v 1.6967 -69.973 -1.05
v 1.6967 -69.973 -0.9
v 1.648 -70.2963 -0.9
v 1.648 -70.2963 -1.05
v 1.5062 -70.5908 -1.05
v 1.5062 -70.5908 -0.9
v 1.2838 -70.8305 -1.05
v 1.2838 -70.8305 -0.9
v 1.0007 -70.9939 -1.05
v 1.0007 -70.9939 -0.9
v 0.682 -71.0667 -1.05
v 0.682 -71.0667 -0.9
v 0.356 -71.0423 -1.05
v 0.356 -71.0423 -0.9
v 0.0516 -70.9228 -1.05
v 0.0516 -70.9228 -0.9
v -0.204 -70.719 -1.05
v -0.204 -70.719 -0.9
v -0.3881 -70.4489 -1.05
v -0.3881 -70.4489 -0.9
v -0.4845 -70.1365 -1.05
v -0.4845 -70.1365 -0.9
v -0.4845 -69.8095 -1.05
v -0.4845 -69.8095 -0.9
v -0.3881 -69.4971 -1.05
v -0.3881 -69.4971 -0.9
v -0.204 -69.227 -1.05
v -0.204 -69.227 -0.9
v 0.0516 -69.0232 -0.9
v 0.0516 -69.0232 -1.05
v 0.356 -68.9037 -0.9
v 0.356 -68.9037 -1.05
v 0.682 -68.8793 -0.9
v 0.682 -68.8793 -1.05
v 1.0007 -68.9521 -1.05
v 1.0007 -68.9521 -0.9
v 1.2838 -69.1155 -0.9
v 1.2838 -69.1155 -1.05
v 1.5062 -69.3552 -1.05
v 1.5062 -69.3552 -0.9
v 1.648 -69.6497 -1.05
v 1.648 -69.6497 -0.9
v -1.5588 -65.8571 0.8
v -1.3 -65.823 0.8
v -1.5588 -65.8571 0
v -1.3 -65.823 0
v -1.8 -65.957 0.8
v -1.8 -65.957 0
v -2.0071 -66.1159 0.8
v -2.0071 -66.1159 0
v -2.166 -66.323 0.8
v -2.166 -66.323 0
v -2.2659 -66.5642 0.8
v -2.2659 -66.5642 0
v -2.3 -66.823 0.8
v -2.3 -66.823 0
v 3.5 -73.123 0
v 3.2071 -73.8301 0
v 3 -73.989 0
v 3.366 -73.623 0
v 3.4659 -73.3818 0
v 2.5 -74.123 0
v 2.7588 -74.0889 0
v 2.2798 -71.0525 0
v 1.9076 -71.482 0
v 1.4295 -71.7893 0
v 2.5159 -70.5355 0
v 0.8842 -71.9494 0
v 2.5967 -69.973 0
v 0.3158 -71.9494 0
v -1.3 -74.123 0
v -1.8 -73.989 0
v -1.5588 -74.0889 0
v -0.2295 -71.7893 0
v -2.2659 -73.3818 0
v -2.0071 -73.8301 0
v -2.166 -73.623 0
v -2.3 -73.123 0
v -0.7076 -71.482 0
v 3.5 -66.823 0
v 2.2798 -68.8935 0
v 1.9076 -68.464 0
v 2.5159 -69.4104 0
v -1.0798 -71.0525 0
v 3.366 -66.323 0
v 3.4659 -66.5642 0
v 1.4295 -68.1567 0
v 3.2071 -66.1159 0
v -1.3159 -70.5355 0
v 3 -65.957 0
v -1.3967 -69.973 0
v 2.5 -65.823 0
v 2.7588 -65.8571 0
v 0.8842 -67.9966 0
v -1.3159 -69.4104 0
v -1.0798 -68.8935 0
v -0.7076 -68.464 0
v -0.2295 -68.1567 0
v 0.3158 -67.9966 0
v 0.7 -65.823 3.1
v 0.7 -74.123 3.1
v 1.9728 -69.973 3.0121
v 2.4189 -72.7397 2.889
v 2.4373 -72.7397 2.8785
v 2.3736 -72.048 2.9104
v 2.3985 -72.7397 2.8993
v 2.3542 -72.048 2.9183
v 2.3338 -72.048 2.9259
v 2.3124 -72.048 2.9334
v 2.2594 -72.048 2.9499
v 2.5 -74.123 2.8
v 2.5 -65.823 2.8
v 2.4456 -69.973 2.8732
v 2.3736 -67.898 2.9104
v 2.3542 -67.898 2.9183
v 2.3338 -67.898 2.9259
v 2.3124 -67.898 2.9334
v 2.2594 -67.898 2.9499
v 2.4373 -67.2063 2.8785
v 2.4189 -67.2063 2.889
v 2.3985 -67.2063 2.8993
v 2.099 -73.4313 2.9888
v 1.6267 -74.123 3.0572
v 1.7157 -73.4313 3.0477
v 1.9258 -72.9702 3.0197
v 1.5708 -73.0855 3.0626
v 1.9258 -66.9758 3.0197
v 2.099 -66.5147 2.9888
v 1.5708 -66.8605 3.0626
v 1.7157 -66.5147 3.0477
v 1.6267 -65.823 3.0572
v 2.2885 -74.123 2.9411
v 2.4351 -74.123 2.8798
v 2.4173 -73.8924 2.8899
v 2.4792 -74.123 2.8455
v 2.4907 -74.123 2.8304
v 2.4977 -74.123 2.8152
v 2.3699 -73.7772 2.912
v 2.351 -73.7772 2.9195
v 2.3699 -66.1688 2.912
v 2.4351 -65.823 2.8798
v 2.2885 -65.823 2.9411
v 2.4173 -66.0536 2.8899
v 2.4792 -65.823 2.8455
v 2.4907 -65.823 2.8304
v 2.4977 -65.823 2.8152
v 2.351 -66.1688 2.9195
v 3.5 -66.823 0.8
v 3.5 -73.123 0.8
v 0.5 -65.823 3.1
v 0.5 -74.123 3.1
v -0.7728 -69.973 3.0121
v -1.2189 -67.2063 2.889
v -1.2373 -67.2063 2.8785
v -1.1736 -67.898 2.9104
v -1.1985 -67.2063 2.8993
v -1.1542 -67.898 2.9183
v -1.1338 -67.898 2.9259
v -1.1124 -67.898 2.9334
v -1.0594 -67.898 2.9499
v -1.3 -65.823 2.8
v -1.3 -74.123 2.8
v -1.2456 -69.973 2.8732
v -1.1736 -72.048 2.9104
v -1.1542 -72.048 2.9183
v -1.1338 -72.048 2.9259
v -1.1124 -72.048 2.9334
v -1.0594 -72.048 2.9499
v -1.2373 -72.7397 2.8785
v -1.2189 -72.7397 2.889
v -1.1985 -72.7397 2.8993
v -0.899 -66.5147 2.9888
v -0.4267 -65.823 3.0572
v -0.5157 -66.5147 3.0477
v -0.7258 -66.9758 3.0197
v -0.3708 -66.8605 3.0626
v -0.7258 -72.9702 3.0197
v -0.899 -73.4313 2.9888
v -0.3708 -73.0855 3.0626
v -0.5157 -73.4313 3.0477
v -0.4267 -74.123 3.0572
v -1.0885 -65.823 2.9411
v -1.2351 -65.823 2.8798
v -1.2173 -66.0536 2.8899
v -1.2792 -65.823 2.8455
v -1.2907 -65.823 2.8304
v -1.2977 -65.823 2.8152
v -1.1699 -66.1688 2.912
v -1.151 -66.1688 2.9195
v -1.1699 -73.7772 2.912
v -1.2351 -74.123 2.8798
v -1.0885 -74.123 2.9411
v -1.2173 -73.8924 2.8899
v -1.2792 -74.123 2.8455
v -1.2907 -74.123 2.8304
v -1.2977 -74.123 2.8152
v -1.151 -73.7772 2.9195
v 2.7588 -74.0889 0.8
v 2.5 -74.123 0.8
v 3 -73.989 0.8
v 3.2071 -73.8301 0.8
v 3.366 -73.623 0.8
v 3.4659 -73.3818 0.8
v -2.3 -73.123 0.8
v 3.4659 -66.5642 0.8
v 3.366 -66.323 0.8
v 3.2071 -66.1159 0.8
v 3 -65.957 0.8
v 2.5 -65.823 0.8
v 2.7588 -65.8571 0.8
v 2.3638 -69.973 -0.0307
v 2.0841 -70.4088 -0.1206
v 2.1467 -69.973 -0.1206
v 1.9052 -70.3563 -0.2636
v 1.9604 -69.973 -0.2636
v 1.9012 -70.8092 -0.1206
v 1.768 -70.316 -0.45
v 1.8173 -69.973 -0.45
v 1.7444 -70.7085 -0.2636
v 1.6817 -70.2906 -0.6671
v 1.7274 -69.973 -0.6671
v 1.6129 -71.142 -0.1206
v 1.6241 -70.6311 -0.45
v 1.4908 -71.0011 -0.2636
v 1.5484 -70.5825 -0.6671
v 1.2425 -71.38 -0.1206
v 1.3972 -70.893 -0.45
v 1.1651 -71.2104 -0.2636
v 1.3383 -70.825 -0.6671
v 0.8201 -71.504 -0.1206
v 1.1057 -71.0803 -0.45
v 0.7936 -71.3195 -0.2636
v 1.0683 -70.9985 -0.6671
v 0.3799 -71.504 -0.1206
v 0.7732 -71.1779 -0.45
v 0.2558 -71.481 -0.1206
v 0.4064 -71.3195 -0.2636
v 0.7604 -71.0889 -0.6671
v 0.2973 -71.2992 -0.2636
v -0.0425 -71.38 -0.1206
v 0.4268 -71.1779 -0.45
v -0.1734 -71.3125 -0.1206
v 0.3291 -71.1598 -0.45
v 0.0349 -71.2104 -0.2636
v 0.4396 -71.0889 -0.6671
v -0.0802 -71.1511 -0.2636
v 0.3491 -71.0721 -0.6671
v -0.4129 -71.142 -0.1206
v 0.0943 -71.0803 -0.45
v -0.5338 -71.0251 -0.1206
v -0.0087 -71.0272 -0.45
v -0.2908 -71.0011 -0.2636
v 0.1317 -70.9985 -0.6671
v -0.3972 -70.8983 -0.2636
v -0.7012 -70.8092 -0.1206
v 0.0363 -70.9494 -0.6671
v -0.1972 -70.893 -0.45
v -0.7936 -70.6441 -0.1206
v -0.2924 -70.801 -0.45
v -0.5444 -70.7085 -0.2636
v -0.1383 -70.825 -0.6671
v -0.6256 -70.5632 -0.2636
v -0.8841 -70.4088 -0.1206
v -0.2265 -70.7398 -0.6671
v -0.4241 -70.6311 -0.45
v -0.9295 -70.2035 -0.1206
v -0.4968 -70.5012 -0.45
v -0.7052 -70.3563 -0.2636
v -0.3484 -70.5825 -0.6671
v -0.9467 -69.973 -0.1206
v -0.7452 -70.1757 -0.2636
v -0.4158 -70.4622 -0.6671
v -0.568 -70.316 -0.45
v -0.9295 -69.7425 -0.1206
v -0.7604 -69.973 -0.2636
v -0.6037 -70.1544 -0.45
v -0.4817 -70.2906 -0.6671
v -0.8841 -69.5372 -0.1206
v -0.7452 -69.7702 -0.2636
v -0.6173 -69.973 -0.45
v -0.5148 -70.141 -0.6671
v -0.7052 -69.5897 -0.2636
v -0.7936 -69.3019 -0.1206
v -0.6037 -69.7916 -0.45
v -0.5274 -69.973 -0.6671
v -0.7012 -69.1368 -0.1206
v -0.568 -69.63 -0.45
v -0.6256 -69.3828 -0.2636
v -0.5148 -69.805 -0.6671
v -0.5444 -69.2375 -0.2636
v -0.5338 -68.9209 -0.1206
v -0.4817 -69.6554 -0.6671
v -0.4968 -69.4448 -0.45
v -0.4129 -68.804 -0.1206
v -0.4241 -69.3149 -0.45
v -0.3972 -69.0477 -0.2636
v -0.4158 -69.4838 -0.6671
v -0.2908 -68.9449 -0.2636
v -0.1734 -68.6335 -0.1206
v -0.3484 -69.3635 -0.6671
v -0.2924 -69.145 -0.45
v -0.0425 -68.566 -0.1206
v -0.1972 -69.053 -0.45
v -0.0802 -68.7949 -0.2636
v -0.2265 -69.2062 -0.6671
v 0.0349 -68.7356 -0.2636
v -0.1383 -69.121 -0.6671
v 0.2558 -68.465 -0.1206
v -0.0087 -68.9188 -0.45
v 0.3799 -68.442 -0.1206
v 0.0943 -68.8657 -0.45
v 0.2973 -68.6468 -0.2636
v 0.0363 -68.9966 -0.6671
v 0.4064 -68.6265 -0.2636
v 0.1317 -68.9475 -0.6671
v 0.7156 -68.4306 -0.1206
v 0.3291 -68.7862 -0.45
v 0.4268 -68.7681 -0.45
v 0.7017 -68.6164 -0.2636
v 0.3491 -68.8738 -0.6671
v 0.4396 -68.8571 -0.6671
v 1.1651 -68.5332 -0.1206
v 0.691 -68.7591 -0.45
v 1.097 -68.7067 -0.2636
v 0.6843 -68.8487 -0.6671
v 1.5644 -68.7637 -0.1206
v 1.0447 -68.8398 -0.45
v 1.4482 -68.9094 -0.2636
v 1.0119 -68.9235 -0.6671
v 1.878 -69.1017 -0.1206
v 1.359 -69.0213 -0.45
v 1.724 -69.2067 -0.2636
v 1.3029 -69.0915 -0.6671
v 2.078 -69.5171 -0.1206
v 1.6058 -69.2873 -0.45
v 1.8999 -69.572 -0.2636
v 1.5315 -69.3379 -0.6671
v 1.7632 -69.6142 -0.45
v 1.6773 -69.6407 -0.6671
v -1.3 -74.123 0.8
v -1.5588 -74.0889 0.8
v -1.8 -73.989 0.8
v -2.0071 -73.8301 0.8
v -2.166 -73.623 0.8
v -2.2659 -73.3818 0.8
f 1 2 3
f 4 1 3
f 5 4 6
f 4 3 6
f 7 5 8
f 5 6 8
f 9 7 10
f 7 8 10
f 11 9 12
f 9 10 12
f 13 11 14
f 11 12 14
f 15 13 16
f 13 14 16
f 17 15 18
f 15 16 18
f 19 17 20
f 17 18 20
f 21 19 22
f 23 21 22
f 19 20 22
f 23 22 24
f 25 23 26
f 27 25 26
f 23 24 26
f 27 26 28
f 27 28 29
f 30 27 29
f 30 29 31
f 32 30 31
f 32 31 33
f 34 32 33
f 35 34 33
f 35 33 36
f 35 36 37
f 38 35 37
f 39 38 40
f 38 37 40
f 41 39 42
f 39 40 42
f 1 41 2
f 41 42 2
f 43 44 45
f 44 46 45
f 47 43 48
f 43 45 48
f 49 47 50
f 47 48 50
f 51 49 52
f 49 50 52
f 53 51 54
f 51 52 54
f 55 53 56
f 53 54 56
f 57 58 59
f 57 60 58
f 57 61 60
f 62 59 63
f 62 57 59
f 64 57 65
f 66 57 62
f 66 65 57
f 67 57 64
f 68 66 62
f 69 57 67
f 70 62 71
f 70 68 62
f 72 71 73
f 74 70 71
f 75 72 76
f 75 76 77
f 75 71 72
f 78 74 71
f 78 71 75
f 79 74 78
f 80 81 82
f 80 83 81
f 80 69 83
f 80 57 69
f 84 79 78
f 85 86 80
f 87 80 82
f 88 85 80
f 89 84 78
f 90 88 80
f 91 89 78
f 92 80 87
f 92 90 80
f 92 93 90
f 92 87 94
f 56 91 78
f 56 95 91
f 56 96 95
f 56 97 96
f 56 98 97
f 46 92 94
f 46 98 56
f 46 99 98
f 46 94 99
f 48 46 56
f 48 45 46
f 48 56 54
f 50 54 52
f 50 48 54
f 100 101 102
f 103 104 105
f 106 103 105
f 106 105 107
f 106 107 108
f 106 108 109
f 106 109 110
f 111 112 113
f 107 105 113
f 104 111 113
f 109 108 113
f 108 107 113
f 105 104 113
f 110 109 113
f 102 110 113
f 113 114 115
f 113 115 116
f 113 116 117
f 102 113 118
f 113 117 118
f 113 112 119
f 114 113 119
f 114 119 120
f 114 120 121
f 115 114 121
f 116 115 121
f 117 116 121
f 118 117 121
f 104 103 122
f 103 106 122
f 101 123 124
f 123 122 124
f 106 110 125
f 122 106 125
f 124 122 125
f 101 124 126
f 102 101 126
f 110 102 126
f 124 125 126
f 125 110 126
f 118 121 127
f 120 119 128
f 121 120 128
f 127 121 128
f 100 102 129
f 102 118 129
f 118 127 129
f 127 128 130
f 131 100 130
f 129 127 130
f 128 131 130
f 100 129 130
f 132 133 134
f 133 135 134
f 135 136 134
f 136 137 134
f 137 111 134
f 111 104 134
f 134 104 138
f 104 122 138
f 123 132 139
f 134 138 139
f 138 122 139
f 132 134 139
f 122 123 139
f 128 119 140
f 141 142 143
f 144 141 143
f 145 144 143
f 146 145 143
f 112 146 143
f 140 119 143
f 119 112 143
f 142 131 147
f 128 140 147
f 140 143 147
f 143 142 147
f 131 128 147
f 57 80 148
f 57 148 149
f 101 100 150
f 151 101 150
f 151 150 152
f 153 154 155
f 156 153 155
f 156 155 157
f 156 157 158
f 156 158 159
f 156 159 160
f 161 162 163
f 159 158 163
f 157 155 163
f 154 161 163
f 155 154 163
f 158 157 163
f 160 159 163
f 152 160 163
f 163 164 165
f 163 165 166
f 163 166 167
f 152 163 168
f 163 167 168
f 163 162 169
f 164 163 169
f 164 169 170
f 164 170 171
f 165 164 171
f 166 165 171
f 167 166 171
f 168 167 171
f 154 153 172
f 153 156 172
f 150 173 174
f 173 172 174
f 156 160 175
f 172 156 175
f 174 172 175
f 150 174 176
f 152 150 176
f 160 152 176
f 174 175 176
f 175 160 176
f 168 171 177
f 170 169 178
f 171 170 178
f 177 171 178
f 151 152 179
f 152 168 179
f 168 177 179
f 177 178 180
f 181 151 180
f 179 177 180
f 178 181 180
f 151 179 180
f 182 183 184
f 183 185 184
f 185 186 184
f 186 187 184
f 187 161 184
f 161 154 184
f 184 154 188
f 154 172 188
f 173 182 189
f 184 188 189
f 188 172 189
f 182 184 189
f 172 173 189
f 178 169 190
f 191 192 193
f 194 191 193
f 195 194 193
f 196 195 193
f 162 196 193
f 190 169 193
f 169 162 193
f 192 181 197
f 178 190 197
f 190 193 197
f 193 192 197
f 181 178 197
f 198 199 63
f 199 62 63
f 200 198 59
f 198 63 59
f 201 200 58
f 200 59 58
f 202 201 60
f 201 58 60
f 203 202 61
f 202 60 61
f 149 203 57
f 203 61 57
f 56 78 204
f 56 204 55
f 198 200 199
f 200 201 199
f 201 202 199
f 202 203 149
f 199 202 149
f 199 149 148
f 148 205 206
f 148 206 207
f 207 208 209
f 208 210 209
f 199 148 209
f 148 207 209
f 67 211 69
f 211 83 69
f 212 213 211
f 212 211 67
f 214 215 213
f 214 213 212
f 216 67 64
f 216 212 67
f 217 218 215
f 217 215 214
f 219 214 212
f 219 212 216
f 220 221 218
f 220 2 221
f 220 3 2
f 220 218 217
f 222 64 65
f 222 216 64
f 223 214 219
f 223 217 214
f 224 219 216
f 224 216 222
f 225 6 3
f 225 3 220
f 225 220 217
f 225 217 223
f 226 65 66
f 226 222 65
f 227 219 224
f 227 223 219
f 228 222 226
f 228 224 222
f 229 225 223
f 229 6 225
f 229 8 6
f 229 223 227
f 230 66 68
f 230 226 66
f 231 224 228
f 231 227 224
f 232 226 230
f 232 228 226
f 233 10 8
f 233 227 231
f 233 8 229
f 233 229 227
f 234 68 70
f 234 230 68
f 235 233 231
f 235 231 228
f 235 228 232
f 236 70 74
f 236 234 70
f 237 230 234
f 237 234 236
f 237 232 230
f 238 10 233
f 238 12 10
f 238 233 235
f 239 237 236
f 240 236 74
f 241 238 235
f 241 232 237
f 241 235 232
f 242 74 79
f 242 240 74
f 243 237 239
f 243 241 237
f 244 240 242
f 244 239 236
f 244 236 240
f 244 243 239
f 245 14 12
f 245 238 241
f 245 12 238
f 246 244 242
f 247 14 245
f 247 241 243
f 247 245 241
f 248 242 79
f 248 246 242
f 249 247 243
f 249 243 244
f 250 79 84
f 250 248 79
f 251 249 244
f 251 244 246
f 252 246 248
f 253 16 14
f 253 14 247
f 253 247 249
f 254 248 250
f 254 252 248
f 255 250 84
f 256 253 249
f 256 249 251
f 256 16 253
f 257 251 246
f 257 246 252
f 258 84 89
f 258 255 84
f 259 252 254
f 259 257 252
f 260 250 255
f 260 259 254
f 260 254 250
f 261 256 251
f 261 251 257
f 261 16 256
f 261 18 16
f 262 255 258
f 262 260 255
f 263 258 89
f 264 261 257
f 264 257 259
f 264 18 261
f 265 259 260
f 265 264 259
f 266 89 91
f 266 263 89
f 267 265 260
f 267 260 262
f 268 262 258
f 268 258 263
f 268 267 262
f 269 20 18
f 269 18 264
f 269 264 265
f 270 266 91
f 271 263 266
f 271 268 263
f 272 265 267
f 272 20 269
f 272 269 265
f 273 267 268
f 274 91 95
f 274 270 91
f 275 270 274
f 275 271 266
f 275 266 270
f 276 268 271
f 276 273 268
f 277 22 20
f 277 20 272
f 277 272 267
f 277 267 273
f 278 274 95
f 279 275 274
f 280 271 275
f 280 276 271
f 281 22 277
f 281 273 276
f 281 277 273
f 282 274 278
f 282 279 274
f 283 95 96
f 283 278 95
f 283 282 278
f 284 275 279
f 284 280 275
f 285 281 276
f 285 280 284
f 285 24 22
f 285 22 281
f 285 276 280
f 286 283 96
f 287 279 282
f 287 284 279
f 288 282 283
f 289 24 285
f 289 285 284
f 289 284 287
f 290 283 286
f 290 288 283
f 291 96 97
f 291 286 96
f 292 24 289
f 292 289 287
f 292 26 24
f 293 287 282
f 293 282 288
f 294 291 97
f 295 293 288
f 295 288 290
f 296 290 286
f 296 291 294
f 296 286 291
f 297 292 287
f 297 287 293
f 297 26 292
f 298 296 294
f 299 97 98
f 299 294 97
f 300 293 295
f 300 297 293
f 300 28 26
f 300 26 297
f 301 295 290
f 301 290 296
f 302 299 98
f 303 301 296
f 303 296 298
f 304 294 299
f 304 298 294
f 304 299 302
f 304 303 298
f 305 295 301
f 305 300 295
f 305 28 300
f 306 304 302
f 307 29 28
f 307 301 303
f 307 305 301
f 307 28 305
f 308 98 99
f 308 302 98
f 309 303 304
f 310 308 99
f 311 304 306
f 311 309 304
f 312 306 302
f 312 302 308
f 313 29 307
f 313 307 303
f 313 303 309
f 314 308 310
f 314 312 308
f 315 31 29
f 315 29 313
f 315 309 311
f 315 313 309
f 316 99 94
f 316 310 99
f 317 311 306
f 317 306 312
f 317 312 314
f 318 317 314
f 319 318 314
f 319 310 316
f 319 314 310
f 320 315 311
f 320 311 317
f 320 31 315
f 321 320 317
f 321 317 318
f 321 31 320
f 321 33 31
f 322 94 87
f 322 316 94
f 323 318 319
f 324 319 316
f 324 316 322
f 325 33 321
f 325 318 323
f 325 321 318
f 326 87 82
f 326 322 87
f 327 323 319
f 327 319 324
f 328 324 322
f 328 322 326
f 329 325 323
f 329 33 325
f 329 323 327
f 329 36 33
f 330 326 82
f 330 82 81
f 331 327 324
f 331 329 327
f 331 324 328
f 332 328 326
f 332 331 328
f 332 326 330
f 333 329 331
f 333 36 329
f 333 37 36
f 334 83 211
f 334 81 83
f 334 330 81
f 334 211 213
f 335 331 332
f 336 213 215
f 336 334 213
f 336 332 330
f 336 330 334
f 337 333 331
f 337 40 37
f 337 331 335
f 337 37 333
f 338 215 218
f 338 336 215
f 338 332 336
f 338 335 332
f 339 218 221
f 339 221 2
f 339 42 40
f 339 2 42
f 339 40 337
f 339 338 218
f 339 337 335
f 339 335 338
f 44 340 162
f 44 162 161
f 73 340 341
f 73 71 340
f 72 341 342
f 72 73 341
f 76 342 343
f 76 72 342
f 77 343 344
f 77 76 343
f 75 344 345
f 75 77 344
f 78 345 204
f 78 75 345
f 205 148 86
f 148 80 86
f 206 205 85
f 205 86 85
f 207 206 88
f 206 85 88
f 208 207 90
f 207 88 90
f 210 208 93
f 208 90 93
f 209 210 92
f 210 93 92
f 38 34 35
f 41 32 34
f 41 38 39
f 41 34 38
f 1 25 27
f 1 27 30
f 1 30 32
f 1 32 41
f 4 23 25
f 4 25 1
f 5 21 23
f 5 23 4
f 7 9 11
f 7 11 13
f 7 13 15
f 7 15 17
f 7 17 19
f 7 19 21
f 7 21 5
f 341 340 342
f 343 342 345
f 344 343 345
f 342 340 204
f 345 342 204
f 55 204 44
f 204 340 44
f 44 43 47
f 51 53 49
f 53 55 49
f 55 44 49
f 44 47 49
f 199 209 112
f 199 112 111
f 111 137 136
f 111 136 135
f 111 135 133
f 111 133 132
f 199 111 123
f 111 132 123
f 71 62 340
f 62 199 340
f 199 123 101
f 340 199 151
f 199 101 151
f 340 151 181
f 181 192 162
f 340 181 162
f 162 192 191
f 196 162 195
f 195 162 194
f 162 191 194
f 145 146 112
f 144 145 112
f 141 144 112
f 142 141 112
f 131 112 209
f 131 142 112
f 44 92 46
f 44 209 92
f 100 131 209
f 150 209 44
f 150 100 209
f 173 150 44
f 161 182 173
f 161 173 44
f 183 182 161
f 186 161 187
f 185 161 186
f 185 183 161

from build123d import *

# Parameters (mm, degrees)
EXTRUDE_1_DEPTH          = 3.1
EXTRUDE_2_DEPTH          = 0.8
FILLET_1_SIZE            = 0.3
FILLET_1_SIZE_2          = 1.8
SKETCH_3_R               = 1
SKETCH_3_R_2             = 1.096749421
EXTRUDE_3_DEPTH          = 1.05
FILLET_5_R               = 0.9
CUT_EXTRUDE_2_DEPTH      = 82.307539193
CUT_EXTRUDE_2_DEPTH_BACK = 82.307539193
SKETCH_7_W               = 25.8
SKETCH_7_H               = 28.300000874
SKETCH_7_W_2             = 5.8
SKETCH_7_H_2             = 8.300000874
FILLET_6_R               = 1


with BuildPart() as part:
    # 草图1 → 凸台-拉伸1 (new body)
    with BuildSketch(Plane.XY):
        with BuildLine():
            Line((-1.3, -78.273), (-1.3, -61.672998253))
            ThreePointArc((-1.3, -61.672998253), (0.6, -59.772998253), (2.5, -61.672998253))
            Line((2.5, -61.672998253), (2.5, -78.273))
            ThreePointArc((2.5, -78.273), (0.6, -80.173), (-1.3, -78.273))
        make_face()
    extrude(amount=EXTRUDE_1_DEPTH)

    # 草图2 → 凸台-拉伸2 (add)
    with BuildSketch(Plane(origin=(0, 0, 0), x_dir=(-1, 0, 0), z_dir=(0, 0, -1))):
        with BuildLine():
            Line((2.3, -78.273), (2.3, -61.672998253))
            ThreePointArc((2.3, -61.672998253), (-0.6, -58.772998253), (-3.5, -61.672998253))
            Line((-3.5, -61.672998253), (-3.5, -78.273))
            ThreePointArc((-3.5, -78.273), (-0.6, -81.173), (2.3, -78.273))
        make_face()
    extrude(amount=-EXTRUDE_2_DEPTH)

    # 圆角1
    # an asymmetric fillet: 1.8, 0.3 mm, written as the material it takes off along each edge
    with BuildSketch(Plane(origin=(2.5, -61.672998253, 3.1), x_dir=(0, 0, -1), z_dir=(0, -1, 0)), Plane(origin=(-1.3, -78.273, 3.1), x_dir=(0, 0, -1), z_dir=(0, 1, 0))) as fillet_1_piece_1:
        with BuildLine():
            Bezier((FILLET_1_SIZE, 0), (0, 0), (0, -FILLET_1_SIZE_2), weights=[1, 0.707106781, 1])
            Line((0, -FILLET_1_SIZE_2), (0, 0))
            Line((0, 0), (FILLET_1_SIZE, 0))
        make_face()
    extrude(amount=16.600001747, mode=Mode.SUBTRACT)
    with BuildSketch(Plane(origin=(0.6, -61.672998253, 3.1), x_dir=(-1, 0, 0), z_dir=(0, -1, 0))) as fillet_1_piece_2:
        with BuildLine():
            Bezier((1.9, FILLET_1_SIZE), (1.9, 0), (1.9 - FILLET_1_SIZE_2, 0), weights=[1, 0.707106781, 1])
            Line((1.9 - FILLET_1_SIZE_2, 0), (1.9, 0))
            Line((1.9, 0), (1.9, FILLET_1_SIZE))
        make_face()
    revolve(axis=Axis((0.6, -61.672998253, 3.1), (0, 0, -1)), revolution_arc=180, mode=Mode.SUBTRACT)
    with BuildSketch(Plane(origin=(0.6, -78.273, 3.1), x_dir=(1, 0, 0), z_dir=(0, 1, 0))) as fillet_1_piece_3:
        with BuildLine():
            Bezier((1.9, FILLET_1_SIZE), (1.9, 0), (1.9 - FILLET_1_SIZE_2, 0), weights=[1, 0.707106781, 1])
            Line((1.9 - FILLET_1_SIZE_2, 0), (1.9, 0))
            Line((1.9, 0), (1.9, FILLET_1_SIZE))
        make_face()
    revolve(axis=Axis((0.6, -78.273, 3.1), (0, 0, -1)), revolution_arc=180, mode=Mode.SUBTRACT)

    # 草图3 → 凸台-拉伸3 (add)
    with BuildSketch(Plane(origin=(0, 0, 0), x_dir=(-1, 0, 0), z_dir=(0, 0, -1))):
        with Locations(Location((-0.6, -61.672998253, 0), (0, 0, 180))):
            Circle(SKETCH_3_R)
        with Locations(Location((-0.6, -69.972999126, 0), (0, 0, 180))):
            Circle(SKETCH_3_R_2)
        with Locations(Location((-0.6, -78.273, 0), (0, 0, 180))):
            Circle(SKETCH_3_R_2)
    extrude(amount=EXTRUDE_3_DEPTH)

    # 圆角5
    fillet_5_edges = [part.edges().sort_by_distance(p)[0] for p in [
        (-0.4, -61.672998253, 0),
        (-0.496749421, -69.972999126, 0),
        (-0.496749421, -78.273, 0),
    ]]
    fillet(fillet_5_edges, radius=FILLET_5_R)

    # 草图7 → 切除-拉伸2 (cut, two sides: drawn at the far end of the back side and taken through both)
    with BuildSketch(Plane(origin=(0, 0, 0), x_dir=(-1, 0, 0), z_dir=(0, 0, -1)).offset(-CUT_EXTRUDE_2_DEPTH_BACK)):
        with Locations((-0.6, -69.972999126)):
            Rectangle(SKETCH_7_W, SKETCH_7_H)
        with Locations((-0.6, -69.972999126)):
            Rectangle(SKETCH_7_W_2, SKETCH_7_H_2, mode=Mode.SUBTRACT)
    extrude(amount=CUT_EXTRUDE_2_DEPTH + CUT_EXTRUDE_2_DEPTH_BACK, mode=Mode.SUBTRACT)

    # 圆角6
    fillet_6_edges = [part.edges().sort_by_distance(p)[0] for p in [
        (3.5, -74.122999563, 0.4),
        (3.5, -65.822998689, 0.4),
        (-2.3, -65.822998689, 0.4),
        (-2.3, -74.122999563, 0.4),
    ]]
    fillet(fillet_6_edges, radius=FILLET_6_R)


solid = part.part
